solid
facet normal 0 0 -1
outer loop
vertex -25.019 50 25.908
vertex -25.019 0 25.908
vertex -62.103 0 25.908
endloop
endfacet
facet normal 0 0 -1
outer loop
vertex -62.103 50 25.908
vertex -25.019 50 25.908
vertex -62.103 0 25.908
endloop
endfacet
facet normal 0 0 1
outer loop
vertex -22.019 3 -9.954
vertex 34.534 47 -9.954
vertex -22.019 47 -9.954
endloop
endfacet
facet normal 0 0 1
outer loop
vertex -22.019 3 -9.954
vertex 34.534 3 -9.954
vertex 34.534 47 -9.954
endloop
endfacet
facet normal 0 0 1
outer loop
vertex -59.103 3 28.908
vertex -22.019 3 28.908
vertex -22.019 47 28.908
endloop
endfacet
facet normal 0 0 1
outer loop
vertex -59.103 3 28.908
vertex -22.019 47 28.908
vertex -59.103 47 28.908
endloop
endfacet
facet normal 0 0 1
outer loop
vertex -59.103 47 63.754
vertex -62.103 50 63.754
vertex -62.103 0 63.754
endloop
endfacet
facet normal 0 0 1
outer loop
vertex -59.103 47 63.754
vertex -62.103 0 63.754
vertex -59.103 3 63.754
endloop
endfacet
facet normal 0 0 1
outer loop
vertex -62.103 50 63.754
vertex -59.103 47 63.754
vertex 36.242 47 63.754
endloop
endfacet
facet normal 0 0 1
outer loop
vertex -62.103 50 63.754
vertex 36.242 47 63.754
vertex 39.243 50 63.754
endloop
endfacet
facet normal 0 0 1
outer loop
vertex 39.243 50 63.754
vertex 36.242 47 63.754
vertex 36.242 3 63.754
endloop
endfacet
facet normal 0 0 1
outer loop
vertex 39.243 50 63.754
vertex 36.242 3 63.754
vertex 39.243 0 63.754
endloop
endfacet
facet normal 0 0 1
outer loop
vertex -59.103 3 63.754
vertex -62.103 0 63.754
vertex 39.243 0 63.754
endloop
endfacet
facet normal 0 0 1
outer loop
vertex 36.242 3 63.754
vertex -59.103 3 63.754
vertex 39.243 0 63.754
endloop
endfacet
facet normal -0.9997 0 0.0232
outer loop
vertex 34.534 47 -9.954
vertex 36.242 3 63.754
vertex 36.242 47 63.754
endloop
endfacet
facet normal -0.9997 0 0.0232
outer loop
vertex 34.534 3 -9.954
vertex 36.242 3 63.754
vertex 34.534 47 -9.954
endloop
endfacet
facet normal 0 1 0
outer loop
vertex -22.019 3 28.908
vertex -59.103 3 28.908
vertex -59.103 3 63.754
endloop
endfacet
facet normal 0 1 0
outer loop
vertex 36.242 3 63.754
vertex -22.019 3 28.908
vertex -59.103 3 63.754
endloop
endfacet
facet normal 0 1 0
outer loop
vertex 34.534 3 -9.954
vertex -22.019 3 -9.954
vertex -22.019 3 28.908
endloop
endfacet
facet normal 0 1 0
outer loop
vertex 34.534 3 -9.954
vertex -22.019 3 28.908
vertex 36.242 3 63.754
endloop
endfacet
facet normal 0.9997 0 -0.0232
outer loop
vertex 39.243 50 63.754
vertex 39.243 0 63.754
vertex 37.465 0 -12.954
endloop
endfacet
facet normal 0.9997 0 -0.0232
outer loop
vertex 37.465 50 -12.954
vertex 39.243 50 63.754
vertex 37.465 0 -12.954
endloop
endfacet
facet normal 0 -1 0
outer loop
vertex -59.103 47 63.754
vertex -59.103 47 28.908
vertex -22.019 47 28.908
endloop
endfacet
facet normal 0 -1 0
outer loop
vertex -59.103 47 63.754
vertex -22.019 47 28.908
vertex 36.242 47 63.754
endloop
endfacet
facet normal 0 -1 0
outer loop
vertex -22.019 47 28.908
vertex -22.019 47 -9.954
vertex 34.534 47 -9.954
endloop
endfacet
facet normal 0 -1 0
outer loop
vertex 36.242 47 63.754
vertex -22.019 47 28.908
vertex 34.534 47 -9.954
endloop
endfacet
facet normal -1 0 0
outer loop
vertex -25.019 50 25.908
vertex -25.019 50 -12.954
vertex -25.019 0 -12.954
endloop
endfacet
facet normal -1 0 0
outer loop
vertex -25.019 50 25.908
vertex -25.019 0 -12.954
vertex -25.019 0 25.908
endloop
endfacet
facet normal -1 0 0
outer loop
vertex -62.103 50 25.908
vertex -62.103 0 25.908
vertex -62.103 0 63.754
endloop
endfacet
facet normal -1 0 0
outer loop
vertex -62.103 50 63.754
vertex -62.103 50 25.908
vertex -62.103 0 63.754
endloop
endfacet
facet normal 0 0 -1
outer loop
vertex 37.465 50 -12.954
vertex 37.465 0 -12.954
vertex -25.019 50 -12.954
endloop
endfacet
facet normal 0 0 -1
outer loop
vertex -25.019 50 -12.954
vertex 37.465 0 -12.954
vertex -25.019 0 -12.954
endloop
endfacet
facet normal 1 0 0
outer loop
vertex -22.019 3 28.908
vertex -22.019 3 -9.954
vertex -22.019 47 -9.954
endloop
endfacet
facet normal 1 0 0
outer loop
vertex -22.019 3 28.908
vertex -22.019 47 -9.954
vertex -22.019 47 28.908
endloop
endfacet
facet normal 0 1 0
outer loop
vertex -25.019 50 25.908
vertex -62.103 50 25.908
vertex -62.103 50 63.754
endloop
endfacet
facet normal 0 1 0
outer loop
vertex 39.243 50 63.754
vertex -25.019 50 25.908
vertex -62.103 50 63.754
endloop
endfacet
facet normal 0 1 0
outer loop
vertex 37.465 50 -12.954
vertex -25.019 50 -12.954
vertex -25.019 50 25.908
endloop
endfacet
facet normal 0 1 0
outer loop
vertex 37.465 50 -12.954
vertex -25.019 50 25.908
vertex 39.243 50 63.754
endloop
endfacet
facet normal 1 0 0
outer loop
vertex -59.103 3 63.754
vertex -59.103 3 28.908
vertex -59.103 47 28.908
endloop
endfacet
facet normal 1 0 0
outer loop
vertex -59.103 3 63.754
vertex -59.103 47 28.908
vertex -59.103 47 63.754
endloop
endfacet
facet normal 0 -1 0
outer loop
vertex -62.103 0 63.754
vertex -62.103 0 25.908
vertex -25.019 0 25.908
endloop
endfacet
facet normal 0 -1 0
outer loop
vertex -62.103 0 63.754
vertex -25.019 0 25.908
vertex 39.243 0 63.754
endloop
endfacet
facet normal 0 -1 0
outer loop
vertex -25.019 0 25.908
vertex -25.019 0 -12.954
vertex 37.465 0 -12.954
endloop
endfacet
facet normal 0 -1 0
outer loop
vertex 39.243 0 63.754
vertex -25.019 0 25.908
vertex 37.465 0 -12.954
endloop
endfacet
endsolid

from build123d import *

# Parameters (mm, degrees)
BOSS_EXTRUDE1_DEPTH = 50
SHELL1_T            = -3


with BuildPart() as part:
    # Sketch1 → Boss-Extrude1 (new body)
    with BuildSketch(Plane(origin=(0, 0, 0), x_dir=(1, 0, 0), z_dir=(0, 1, 0))):
        Polygon((-25.019, 12.954), (-25.019, -25.908), (-62.103, -25.908), (-62.103, -63.754), (39.243, -63.754), (37.465, 12.954), align=None)
    extrude(amount=BOSS_EXTRUDE1_DEPTH)

    # Shell1
    shell1_openings = [part.faces().sort_by_distance(p)[0] for p in [
        (-11.43, 25, 63.754),
    ]]
    offset(amount=SHELL1_T, openings=shell1_openings, kind=Kind.INTERSECTION)


solid = part.part
